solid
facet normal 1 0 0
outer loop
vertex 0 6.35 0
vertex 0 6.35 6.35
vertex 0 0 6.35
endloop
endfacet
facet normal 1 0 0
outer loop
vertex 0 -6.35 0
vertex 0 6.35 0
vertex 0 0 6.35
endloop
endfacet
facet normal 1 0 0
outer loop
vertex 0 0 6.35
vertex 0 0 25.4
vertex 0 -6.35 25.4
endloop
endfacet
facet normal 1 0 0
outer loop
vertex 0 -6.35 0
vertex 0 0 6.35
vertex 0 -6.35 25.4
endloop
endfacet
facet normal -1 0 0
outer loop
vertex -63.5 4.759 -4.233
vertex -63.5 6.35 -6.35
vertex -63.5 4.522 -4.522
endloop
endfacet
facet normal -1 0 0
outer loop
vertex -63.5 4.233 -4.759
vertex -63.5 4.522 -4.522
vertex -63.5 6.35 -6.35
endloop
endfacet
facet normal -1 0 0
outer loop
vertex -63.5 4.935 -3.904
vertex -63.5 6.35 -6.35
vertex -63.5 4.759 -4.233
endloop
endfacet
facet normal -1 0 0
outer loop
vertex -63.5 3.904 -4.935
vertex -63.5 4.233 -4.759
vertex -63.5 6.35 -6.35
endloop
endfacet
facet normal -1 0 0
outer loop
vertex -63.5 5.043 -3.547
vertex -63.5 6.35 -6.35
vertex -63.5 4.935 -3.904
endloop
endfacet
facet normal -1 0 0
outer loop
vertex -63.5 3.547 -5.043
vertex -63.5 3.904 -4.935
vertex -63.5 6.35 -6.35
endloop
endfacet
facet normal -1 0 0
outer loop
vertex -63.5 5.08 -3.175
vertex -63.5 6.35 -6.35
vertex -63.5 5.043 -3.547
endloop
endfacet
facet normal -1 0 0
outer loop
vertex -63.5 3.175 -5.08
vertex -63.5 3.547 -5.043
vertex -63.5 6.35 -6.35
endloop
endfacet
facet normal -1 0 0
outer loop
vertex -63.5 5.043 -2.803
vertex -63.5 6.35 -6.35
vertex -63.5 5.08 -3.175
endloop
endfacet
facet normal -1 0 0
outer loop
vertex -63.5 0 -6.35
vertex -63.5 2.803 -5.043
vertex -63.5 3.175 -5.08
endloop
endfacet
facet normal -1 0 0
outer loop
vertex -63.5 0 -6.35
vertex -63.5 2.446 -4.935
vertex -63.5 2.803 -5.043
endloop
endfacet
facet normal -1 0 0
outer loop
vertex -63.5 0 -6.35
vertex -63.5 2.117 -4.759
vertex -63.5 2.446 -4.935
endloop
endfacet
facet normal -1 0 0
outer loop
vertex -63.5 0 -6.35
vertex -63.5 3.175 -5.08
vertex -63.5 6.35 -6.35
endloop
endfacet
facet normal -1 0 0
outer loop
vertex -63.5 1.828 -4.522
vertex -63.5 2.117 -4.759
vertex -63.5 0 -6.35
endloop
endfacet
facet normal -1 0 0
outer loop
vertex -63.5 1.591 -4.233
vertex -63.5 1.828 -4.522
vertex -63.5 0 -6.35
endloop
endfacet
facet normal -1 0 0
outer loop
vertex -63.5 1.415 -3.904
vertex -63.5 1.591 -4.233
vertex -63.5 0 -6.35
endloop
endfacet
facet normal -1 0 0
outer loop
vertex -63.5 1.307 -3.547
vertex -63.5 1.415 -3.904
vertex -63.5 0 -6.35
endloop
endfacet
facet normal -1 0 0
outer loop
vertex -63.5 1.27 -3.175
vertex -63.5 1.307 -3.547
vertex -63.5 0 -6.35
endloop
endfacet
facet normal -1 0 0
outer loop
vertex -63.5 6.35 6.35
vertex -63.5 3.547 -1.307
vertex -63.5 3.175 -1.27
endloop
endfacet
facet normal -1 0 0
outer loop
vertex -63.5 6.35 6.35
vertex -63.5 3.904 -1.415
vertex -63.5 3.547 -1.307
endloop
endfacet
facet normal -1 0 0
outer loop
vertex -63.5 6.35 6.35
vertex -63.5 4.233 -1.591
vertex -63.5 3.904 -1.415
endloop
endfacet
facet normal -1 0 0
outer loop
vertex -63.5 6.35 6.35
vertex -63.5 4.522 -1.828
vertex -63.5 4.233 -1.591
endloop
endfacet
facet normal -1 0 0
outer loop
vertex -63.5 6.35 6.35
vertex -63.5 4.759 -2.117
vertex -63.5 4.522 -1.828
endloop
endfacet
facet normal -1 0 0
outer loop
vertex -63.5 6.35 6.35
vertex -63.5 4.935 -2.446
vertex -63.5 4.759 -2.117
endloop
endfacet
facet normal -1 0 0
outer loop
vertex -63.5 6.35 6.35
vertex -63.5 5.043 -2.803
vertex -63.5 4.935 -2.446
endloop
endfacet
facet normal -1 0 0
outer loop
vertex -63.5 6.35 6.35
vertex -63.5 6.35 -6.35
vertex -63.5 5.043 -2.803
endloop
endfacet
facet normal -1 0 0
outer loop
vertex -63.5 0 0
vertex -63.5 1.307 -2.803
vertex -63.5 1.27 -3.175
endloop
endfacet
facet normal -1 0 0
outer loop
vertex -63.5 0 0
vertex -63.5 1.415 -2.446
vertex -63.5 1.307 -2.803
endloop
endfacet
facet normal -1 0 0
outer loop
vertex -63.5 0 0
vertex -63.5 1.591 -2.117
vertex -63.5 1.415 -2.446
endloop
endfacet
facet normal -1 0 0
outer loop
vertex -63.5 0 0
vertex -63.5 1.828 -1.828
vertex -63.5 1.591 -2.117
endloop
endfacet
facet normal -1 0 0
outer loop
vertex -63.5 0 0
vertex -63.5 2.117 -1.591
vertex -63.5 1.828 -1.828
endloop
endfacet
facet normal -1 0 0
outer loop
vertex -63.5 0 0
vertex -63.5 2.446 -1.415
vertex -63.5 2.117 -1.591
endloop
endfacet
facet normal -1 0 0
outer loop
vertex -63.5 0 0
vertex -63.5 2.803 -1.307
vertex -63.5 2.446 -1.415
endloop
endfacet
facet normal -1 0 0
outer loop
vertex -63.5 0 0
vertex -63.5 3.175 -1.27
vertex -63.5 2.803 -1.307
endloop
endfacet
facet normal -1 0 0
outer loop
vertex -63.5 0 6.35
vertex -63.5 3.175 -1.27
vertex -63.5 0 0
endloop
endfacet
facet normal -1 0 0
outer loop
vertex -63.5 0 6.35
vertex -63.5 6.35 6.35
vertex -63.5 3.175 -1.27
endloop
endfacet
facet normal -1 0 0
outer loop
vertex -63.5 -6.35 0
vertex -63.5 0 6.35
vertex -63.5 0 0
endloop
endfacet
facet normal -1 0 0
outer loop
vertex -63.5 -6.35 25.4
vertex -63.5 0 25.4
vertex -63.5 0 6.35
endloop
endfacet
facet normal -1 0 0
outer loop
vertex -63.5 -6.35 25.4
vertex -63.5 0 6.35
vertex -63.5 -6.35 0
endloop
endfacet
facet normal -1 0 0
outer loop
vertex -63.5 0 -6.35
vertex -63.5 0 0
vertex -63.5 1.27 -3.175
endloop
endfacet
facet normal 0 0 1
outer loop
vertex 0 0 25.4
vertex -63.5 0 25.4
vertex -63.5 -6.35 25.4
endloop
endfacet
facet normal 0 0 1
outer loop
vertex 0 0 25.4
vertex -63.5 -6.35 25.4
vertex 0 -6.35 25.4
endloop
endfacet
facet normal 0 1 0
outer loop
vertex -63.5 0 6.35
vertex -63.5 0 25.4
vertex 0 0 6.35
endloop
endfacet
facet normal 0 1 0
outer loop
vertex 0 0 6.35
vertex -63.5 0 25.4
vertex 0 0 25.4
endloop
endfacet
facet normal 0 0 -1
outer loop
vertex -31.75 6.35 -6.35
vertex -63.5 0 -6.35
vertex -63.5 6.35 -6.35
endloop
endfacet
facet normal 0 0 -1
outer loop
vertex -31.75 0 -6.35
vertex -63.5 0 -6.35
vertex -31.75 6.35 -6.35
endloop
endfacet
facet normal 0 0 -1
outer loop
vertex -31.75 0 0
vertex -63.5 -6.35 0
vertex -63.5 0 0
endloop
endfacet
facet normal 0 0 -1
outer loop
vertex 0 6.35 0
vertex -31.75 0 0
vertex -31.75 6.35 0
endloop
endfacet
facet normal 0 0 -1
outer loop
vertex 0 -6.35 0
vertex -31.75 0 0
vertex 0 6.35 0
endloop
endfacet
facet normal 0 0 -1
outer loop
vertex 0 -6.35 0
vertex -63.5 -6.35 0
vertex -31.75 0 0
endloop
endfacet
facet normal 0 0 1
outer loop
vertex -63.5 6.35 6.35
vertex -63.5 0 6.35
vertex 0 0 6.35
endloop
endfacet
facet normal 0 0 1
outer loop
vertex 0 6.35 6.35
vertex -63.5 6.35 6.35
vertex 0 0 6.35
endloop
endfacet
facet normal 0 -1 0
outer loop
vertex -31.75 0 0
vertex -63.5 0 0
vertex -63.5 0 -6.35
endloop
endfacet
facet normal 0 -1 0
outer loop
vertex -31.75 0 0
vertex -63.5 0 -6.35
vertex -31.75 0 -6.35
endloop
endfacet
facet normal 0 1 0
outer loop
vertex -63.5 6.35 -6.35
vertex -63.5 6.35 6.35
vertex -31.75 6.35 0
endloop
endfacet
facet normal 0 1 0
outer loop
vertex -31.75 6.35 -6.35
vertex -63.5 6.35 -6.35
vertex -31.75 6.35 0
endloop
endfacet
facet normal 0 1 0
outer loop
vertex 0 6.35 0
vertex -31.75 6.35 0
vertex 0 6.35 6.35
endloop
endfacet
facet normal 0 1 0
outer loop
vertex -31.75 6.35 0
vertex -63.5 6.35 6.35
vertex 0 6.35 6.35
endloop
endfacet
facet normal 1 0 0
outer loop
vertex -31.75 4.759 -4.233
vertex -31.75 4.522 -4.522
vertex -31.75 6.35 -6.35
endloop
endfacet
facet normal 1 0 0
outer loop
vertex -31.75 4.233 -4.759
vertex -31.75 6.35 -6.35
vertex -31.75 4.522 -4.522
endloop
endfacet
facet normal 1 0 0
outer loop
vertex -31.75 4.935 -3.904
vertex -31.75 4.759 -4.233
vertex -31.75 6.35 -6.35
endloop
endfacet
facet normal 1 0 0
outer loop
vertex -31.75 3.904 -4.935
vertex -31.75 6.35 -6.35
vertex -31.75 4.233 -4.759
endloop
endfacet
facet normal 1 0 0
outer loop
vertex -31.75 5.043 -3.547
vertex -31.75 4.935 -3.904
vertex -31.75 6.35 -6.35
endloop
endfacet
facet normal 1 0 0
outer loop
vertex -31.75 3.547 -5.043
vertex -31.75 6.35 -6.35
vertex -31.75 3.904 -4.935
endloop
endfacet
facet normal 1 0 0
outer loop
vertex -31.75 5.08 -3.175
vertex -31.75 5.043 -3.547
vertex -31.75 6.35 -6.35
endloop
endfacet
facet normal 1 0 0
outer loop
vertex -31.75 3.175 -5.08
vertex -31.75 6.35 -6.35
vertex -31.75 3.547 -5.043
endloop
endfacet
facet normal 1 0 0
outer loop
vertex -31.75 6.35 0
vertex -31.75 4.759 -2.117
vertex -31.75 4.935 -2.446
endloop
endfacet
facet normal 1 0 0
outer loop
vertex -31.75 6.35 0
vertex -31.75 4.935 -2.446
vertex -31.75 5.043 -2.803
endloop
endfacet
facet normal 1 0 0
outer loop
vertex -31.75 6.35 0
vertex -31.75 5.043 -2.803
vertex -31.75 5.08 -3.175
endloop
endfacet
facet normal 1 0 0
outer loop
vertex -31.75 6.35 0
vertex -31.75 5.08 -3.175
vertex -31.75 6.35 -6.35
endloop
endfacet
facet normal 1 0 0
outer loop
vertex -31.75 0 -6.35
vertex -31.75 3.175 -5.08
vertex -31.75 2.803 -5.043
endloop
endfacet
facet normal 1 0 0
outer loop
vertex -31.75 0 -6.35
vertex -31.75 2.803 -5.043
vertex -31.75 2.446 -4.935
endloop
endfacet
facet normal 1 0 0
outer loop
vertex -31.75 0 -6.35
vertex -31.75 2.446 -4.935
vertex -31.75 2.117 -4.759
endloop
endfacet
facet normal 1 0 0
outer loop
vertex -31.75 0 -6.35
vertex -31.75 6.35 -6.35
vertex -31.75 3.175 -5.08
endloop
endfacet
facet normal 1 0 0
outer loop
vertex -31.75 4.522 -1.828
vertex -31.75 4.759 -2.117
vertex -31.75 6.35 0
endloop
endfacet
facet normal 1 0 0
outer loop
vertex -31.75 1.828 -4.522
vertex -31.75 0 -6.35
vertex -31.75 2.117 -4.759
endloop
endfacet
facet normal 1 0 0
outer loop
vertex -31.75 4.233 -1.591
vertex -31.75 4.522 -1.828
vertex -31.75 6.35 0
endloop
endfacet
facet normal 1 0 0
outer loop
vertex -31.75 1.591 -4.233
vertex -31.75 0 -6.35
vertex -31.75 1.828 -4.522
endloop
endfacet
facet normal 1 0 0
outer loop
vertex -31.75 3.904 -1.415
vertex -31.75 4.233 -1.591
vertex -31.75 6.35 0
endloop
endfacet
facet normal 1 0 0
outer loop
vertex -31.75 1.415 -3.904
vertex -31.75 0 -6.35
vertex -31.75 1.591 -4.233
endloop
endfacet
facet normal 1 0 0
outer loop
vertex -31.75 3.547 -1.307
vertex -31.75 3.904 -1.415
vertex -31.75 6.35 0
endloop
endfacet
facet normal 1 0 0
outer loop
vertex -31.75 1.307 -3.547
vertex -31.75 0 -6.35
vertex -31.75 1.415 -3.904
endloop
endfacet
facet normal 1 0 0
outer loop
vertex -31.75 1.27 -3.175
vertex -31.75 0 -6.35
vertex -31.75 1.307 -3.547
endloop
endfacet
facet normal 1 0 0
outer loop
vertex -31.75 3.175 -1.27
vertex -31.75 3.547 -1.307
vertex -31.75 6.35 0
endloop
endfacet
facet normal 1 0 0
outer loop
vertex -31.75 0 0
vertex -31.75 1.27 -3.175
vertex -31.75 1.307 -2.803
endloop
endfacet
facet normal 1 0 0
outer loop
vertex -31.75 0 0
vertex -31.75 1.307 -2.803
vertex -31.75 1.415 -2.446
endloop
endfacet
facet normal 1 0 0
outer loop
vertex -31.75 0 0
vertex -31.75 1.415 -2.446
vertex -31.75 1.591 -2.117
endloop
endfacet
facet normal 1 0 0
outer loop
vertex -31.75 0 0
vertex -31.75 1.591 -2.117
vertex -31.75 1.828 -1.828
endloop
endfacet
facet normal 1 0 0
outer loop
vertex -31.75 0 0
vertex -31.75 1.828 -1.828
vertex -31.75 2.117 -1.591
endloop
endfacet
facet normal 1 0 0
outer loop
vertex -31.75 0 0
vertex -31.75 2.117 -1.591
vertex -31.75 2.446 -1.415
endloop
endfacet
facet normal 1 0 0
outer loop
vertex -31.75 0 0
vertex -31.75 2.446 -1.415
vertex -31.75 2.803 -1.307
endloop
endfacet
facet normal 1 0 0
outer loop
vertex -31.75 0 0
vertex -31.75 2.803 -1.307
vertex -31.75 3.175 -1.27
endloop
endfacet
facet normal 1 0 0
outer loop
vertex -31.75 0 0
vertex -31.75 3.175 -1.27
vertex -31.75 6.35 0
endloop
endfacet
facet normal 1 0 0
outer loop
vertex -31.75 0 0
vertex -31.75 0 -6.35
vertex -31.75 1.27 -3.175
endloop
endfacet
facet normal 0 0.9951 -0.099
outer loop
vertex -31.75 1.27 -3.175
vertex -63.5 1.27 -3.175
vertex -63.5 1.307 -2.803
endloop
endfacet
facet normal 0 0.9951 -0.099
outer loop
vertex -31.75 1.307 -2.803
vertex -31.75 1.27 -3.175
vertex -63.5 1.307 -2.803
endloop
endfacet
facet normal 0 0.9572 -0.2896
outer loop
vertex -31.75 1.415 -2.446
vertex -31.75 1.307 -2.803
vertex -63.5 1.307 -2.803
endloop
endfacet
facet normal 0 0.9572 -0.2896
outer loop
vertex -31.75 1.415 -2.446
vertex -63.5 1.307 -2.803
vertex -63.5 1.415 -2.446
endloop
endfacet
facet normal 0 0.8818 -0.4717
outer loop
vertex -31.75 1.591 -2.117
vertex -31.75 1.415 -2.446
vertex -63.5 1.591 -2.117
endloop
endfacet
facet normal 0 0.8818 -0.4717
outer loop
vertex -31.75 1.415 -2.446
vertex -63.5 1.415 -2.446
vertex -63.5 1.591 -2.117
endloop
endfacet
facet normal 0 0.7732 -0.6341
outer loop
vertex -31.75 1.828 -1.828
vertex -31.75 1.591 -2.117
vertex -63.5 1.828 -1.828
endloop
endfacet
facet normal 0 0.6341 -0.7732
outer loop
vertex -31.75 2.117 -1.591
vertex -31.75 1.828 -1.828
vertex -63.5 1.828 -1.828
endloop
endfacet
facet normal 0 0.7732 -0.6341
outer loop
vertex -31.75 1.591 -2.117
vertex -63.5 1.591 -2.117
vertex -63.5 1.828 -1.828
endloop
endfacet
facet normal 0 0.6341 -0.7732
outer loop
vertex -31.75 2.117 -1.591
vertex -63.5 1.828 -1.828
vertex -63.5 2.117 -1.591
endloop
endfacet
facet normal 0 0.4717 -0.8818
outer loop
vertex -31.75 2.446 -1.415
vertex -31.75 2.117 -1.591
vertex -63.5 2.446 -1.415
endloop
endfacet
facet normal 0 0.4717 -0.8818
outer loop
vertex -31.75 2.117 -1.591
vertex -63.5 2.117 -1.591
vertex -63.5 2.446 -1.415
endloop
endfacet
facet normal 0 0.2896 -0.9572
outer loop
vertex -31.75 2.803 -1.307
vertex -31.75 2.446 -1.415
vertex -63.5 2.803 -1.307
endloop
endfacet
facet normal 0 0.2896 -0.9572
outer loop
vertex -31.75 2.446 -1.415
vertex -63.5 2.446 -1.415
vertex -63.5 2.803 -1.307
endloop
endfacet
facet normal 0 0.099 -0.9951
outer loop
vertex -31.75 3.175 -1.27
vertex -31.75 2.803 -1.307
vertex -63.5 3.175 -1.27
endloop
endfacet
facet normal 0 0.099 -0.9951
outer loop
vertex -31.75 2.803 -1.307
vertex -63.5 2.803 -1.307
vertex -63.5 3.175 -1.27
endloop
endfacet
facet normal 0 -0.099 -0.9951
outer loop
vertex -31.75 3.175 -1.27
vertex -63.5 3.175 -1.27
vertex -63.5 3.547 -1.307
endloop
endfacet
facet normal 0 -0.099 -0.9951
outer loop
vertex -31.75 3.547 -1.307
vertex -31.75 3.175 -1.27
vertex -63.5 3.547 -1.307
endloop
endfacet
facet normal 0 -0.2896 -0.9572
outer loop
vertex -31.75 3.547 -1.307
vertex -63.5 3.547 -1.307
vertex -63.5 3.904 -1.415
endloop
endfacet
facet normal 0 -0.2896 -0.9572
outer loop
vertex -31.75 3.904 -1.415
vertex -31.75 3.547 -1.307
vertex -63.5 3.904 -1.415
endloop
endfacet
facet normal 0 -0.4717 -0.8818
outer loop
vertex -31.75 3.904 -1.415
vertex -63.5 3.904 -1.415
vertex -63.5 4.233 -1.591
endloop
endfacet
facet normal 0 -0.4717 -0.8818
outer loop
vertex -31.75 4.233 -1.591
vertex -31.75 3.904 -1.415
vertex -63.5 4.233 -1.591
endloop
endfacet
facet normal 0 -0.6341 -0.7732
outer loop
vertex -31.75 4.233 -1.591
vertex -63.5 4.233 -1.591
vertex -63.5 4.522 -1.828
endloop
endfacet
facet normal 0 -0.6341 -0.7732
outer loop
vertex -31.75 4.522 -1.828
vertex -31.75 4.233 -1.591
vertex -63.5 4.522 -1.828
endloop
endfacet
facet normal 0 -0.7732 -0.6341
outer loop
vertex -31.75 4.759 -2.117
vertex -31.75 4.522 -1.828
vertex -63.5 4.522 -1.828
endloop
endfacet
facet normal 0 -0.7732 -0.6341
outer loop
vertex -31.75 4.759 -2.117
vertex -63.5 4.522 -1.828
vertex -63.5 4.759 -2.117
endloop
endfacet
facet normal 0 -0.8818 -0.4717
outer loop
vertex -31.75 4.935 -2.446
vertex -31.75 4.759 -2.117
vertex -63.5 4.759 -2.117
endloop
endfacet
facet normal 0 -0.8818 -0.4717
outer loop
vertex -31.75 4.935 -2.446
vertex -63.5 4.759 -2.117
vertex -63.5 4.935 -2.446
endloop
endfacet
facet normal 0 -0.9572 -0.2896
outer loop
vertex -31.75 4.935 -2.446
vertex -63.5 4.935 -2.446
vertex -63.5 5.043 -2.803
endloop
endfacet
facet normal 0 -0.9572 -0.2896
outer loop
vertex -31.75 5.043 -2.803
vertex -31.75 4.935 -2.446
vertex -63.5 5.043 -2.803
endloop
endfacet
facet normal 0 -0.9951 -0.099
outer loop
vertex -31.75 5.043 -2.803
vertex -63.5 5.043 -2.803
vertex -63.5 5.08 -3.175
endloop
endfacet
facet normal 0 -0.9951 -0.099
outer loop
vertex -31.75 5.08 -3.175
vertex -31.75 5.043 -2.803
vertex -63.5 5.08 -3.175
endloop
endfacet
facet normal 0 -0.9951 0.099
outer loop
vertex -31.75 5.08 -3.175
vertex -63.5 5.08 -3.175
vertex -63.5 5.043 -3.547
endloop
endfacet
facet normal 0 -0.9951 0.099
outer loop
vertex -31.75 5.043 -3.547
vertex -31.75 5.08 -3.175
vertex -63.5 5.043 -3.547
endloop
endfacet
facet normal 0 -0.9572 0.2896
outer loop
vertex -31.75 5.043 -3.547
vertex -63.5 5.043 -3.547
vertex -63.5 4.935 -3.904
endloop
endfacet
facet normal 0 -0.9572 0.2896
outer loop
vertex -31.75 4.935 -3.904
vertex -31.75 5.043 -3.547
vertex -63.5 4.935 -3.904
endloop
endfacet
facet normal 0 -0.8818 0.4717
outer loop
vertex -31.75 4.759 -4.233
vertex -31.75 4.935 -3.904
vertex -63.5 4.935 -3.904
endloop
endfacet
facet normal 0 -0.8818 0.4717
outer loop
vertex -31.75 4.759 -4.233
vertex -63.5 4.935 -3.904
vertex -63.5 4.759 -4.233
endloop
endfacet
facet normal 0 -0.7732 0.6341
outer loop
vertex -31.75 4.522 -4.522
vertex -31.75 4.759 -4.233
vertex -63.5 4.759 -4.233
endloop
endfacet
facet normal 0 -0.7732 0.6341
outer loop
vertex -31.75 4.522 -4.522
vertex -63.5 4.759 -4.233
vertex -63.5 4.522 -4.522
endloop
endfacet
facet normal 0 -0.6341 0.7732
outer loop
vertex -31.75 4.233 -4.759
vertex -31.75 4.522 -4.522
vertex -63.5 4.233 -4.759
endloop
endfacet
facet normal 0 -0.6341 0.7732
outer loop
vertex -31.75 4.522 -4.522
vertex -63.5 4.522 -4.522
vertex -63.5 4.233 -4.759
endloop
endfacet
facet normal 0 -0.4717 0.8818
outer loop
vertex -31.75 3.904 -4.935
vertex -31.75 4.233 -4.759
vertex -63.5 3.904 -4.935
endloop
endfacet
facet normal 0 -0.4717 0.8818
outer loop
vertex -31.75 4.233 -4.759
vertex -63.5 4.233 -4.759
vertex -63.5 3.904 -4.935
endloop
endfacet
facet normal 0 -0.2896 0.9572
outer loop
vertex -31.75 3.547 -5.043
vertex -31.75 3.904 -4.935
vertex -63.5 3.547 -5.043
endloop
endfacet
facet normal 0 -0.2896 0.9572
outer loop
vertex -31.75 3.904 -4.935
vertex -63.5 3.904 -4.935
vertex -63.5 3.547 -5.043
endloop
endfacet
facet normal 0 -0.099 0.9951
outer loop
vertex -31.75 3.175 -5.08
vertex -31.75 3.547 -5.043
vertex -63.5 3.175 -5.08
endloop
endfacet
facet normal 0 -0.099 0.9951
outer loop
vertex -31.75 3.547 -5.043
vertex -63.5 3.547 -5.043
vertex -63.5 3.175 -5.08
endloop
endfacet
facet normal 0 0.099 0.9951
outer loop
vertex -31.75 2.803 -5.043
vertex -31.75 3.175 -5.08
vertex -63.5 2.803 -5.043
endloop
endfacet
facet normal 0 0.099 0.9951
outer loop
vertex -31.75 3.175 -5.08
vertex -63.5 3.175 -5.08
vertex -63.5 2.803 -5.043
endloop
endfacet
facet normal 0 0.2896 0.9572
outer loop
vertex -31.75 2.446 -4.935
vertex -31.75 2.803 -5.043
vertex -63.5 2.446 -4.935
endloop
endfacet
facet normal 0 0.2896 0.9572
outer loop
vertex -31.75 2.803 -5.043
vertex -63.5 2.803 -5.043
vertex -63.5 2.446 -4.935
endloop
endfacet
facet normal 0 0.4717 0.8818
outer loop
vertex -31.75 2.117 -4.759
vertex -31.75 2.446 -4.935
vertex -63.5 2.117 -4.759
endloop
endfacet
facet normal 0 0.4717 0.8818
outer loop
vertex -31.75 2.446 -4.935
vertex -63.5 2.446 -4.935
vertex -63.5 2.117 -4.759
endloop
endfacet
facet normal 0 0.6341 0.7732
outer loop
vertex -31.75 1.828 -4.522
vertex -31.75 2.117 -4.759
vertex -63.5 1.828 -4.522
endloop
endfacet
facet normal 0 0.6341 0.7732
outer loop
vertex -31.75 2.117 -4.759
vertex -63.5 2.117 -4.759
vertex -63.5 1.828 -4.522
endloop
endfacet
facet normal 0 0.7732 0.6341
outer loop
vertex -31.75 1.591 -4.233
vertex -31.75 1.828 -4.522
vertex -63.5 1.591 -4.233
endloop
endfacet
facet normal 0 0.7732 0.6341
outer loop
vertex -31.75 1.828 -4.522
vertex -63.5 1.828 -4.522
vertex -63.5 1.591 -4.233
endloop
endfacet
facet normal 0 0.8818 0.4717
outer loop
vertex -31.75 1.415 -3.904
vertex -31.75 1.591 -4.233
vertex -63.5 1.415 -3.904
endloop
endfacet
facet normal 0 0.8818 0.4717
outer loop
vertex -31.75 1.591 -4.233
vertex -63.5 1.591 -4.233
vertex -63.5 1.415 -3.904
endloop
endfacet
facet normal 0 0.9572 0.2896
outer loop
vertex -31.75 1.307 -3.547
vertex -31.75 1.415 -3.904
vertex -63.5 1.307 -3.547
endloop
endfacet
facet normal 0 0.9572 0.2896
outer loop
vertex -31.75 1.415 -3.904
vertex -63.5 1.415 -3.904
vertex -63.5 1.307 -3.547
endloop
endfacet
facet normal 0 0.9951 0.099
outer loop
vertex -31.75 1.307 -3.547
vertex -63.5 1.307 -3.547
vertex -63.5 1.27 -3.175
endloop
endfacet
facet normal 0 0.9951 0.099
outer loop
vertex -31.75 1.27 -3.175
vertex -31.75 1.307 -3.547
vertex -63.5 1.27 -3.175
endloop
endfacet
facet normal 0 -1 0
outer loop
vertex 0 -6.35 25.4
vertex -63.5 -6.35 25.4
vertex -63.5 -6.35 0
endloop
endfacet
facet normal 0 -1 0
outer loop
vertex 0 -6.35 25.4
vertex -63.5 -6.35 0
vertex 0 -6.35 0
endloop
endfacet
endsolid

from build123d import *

# Parameters (mm, degrees)
F0_W     = 63.5
F0_H     = 25.4
F1_DEPTH = 6.35
F2_W     = 63.5
F2_H     = 6.35
F3_DEPTH = 6.35
F4_W     = 63.5
F4_H     = 6.35
F5_DEPTH = 6.35
F6_R     = 1.905
F7_DEPTH = 63.501
F8_W     = 31.75
F8_H     = 6.35
F9_DEPTH = 25.4


with BuildPart() as f1:
    # F0 (on Front) → F1 (new body)
    with BuildSketch(Plane.XZ):
        with Locations((-31.75, 12.7)):
            Rectangle(F0_W, F0_H)
    extrude(amount=F1_DEPTH)

    # F2 (on Front) → F3 (join)
    with BuildSketch(Plane.XZ):
        with Locations((-31.75, 3.175)):
            Rectangle(F2_W, F2_H)
    extrude(amount=-F3_DEPTH)

    # F4 (on face) → F5 (join)
    with BuildSketch(Plane(origin=(0, 0, 0), x_dir=(1, 0, 0), z_dir=(0, 0, -1))):
        with Locations((-31.75, -3.175)):
            Rectangle(F4_W, F4_H)
    extrude(amount=F5_DEPTH)

    # F6 (on face) → F7 (cut, through all)
    with BuildSketch(Plane(origin=(-63.5, 0, 0), x_dir=(0, -1, 0), z_dir=(-1, 0, 0))):
        with Locations((-3.175, -3.175)):
            Circle(F6_R)
    extrude(amount=-F7_DEPTH, mode=Mode.SUBTRACT)

    # F8 (on face) → F9 (cut)
    with BuildSketch(Plane.XZ):
        with Locations((-15.875, -3.175)):
            Rectangle(F8_W, F8_H)
    extrude(amount=-F9_DEPTH, mode=Mode.SUBTRACT)


solid = f1.part
